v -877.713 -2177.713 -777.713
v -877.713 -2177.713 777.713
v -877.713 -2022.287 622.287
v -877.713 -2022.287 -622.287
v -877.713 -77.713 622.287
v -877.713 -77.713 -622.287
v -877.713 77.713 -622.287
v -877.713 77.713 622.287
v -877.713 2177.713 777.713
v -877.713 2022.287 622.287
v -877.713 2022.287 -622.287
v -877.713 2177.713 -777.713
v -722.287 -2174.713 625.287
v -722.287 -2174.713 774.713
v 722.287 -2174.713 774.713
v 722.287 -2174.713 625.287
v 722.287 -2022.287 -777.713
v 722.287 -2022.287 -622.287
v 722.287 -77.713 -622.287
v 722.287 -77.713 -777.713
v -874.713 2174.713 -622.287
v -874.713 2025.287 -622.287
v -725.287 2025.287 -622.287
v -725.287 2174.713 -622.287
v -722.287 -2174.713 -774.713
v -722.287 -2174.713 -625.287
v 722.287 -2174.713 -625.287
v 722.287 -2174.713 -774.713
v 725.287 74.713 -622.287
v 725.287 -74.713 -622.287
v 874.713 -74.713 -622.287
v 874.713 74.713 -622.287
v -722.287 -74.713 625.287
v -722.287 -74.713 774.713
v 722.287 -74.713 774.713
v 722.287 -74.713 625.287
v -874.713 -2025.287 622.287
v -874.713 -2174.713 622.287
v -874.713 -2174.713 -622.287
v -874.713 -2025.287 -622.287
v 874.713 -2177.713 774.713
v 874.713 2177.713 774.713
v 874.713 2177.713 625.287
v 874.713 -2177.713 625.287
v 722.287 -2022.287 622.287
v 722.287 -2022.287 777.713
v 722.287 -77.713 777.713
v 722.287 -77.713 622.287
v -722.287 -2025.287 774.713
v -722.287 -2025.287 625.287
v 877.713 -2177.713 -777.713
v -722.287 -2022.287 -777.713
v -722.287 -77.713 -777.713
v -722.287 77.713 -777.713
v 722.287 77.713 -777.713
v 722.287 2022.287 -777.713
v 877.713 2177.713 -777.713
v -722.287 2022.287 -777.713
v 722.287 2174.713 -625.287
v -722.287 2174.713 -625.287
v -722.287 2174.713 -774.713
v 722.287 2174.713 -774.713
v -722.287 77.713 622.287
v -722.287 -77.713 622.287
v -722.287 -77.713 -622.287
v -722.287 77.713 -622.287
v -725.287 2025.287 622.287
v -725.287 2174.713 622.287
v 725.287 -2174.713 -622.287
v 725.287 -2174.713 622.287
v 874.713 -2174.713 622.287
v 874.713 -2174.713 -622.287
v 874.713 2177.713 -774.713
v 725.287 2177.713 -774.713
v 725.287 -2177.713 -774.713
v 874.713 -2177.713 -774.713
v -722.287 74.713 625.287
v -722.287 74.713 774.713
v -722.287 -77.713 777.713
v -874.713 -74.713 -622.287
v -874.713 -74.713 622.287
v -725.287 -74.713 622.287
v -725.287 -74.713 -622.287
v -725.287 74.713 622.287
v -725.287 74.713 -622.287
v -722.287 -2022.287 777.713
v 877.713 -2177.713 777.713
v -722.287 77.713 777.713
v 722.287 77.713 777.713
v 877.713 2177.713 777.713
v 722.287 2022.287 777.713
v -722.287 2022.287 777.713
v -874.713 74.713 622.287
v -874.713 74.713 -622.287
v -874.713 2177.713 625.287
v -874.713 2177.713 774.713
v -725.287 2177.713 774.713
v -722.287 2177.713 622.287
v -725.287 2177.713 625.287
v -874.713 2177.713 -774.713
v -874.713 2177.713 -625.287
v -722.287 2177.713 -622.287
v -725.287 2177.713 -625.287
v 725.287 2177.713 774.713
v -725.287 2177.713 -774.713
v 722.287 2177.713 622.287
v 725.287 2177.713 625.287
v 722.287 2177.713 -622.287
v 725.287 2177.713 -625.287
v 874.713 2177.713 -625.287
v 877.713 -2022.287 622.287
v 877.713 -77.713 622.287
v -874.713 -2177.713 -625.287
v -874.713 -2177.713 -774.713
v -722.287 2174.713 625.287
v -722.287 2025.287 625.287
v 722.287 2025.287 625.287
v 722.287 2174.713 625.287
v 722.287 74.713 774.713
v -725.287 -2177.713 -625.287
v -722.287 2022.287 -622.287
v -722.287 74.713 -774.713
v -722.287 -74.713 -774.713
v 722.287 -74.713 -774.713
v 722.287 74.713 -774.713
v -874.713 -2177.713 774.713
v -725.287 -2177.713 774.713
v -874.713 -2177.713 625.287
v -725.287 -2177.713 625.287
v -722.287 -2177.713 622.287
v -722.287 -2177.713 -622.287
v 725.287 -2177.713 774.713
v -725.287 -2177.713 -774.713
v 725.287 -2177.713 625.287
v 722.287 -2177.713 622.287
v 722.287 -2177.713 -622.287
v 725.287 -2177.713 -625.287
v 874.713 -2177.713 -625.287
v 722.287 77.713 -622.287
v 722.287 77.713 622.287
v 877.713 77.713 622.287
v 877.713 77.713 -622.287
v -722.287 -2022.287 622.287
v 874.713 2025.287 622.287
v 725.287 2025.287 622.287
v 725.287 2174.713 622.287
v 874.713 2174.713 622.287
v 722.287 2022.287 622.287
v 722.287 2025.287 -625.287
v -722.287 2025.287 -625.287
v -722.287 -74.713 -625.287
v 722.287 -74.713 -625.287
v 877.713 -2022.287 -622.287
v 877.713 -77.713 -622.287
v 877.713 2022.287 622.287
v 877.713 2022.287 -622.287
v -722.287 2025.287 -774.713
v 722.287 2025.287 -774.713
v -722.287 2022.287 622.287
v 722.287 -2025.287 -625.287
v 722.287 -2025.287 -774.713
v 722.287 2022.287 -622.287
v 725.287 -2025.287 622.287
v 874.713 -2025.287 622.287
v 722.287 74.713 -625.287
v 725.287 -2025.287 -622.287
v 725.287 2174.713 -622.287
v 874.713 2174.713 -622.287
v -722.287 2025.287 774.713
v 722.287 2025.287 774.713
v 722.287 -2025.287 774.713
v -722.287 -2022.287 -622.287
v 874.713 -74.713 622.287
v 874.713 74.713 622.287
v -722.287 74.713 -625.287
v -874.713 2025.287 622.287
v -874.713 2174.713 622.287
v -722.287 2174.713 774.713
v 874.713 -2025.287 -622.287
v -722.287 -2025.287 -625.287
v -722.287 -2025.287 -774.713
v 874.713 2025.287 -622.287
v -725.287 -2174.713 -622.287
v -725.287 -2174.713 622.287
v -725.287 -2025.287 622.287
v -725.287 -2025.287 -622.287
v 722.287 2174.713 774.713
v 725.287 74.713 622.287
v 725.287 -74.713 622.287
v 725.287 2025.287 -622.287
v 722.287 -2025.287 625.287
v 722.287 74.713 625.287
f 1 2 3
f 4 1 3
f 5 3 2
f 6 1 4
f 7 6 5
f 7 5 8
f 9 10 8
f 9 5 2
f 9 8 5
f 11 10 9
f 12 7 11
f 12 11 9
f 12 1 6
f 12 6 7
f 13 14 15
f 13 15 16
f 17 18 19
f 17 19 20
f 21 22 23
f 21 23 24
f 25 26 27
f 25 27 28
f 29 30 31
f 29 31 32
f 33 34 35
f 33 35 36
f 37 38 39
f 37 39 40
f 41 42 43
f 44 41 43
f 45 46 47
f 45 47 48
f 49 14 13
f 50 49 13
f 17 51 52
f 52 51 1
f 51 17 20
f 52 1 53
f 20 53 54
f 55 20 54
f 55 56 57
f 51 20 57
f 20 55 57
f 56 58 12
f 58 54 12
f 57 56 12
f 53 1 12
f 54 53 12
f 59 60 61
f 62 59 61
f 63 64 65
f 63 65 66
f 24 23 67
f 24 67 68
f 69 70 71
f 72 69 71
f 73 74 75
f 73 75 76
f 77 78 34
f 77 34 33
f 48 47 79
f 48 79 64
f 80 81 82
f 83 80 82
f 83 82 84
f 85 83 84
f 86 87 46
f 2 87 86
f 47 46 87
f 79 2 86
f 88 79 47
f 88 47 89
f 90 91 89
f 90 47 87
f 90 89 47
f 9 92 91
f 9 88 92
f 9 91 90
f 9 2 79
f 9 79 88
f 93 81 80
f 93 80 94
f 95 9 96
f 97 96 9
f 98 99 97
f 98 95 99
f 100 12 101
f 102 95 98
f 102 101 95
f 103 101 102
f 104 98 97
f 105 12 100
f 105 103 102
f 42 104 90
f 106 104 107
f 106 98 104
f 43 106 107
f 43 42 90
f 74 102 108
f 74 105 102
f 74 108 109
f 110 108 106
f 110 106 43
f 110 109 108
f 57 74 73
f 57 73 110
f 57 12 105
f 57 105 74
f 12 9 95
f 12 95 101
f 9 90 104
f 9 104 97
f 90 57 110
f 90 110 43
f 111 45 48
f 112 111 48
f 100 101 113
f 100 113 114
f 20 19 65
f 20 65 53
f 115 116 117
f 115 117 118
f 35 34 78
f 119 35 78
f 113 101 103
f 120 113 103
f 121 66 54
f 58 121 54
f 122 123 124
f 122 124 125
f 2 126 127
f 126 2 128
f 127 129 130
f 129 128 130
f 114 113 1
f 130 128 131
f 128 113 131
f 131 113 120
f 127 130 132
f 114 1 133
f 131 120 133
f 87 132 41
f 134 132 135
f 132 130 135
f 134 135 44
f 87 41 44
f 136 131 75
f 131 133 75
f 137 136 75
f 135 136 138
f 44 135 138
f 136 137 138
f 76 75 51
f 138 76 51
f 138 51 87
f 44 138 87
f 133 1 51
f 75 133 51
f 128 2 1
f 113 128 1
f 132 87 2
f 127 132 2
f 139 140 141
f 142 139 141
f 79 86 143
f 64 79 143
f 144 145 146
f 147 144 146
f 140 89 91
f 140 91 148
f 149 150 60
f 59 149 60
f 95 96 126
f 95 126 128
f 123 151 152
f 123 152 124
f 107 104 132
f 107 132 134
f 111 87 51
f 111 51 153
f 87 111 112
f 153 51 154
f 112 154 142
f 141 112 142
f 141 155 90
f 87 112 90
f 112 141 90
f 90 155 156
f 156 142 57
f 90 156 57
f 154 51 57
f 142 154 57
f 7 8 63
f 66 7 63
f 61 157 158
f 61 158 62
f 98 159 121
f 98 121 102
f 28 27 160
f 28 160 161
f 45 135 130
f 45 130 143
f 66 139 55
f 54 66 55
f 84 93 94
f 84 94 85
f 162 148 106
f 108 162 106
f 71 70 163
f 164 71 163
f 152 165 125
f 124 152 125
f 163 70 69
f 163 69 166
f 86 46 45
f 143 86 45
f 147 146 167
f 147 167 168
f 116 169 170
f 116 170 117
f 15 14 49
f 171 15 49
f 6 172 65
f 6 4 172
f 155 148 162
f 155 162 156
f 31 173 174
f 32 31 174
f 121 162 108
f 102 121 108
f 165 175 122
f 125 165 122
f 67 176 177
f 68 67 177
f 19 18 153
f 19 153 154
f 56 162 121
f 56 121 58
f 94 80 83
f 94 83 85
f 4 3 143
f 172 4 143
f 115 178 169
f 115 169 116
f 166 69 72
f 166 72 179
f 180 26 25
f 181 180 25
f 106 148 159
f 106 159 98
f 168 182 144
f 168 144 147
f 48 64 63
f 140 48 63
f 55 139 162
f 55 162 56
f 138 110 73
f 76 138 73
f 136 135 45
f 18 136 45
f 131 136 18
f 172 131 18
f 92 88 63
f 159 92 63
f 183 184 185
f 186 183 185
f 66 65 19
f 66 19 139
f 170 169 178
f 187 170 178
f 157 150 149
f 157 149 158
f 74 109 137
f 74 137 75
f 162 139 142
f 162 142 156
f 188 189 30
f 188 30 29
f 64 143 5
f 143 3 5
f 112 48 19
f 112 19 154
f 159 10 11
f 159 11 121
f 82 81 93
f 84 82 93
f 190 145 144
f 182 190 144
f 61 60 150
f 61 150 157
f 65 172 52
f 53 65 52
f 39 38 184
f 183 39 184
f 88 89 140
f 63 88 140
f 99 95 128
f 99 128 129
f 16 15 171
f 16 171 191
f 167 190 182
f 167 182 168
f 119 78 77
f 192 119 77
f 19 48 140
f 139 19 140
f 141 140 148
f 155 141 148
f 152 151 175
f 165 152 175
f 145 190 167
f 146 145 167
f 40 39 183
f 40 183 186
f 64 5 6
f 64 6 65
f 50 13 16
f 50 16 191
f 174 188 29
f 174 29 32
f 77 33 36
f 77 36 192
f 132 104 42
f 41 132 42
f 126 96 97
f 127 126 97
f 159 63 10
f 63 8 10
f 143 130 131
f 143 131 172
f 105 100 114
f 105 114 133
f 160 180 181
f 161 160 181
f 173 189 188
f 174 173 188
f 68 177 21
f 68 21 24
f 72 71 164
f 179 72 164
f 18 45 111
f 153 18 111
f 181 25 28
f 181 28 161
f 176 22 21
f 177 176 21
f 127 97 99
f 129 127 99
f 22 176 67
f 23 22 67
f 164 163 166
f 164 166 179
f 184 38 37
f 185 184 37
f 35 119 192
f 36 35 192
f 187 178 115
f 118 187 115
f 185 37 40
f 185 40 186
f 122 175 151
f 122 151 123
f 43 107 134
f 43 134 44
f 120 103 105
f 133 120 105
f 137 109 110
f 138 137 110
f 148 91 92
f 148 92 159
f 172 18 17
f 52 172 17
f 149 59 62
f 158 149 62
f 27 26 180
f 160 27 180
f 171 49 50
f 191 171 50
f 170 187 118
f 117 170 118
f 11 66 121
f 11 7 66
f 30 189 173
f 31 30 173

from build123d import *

# Parameters (mm, degrees)
BOSS_EXTRUDE1_START  = -2177.712701274
SKETCH1_W            = 155.425402548
SKETCH1_H            = 155.425402548
SKETCH1_W_2          = 149.425402548
SKETCH1_H_2          = 149.425402548
BOSS_EXTRUDE1_DEPTH  = 4355.425402548
BOSS_EXTRUDE2_START  = -2177.712701274
SKETCH2_W            = 155.425402548
SKETCH2_H            = 155.425402548
SKETCH2_W_2          = 149.425402548
SKETCH2_H_2          = 149.425402548
BOSS_EXTRUDE2_DEPTH  = 4355.425402548
BOSS_EXTRUDE3_START  = -2177.712701274
SKETCH3_W            = 155.425402548
SKETCH3_H            = 155.425402548
SKETCH3_W_2          = 149.425402548
SKETCH3_H_2          = 149.425402548
BOSS_EXTRUDE3_DEPTH  = 4355.425402548
BOSS_EXTRUDE4_START  = -2177.712701274
SKETCH4_W            = 155.425402548
SKETCH4_H            = 155.425402548
SKETCH4_W_2          = 149.425402548
SKETCH4_H_2          = 149.425402548
BOSS_EXTRUDE4_DEPTH  = 4355.425402548
BOSS_EXTRUDE5_START  = -722.287298726
SKETCH5_W            = 155.425402548
SKETCH5_H            = 155.425402548
SKETCH5_W_2          = 149.425402548
SKETCH5_H_2          = 149.425402548
BOSS_EXTRUDE5_DEPTH  = 1444.574597452
BOSS_EXTRUDE6_START  = -722.287298726
SKETCH6_W            = 155.425402548
SKETCH6_H            = 155.425402548
SKETCH6_W_2          = 149.425402548
SKETCH6_H_2          = 149.425402548
BOSS_EXTRUDE6_DEPTH  = 1444.574597452
BOSS_EXTRUDE7_START  = -622.287298726
SKETCH7_W            = 155.425402548
SKETCH7_H            = 155.425402548
SKETCH7_W_2          = 149.425402548
SKETCH7_H_2          = 149.425402548
BOSS_EXTRUDE7_DEPTH  = 1244.574597452
BOSS_EXTRUDE8_START  = -622.287298726
SKETCH8_W            = 155.425402548
SKETCH8_H            = 155.425402548
SKETCH8_W_2          = 149.425402548
SKETCH8_H_2          = 149.425402548
BOSS_EXTRUDE8_DEPTH  = 1244.574597452
BOSS_EXTRUDE9_START  = -722.287298726
SKETCH9_W            = 155.425402548
SKETCH9_H            = 155.425402548
SKETCH9_W_2          = 149.425402548
SKETCH9_H_2          = 149.425402548
BOSS_EXTRUDE9_DEPTH  = 1444.574597452
BOSS_EXTRUDE10_START = -722.287298726
SKETCH10_W           = 155.425402548
SKETCH10_H           = 155.425402548
SKETCH10_W_2         = 149.425402548
SKETCH10_H_2         = 149.425402548
BOSS_EXTRUDE10_DEPTH = 1444.574597452
BOSS_EXTRUDE11_START = -622.287298726
SKETCH11_W           = 155.425402548
SKETCH11_H           = 155.425402548
SKETCH11_W_2         = 149.425402548
SKETCH11_H_2         = 149.425402548
BOSS_EXTRUDE11_DEPTH = 1244.574597452
BOSS_EXTRUDE12_START = -622.287298726
SKETCH12_W           = 155.425402548
SKETCH12_H           = 155.425402548
SKETCH12_W_2         = 149.425402548
SKETCH12_H_2         = 149.425402548
BOSS_EXTRUDE12_DEPTH = 1244.574597452
BOSS_EXTRUDE13_START = -722.287298726
SKETCH13_W           = 155.425402548
SKETCH13_H           = 155.425402548
SKETCH13_W_2         = 149.425402548
SKETCH13_H_2         = 149.425402548
BOSS_EXTRUDE13_DEPTH = 1444.574597452
BOSS_EXTRUDE14_START = -722.287298726
SKETCH14_W           = 155.425402548
SKETCH14_H           = 155.425402548
SKETCH14_W_2         = 149.425402548
SKETCH14_H_2         = 149.425402548
BOSS_EXTRUDE14_DEPTH = 1444.574597452
BOSS_EXTRUDE15_START = -622.287298726
SKETCH15_W           = 155.425402548
SKETCH15_H           = 155.425402548
SKETCH15_W_2         = 149.425402548
SKETCH15_H_2         = 149.425402548
BOSS_EXTRUDE15_DEPTH = 1244.574597452
BOSS_EXTRUDE16_START = -622.287298726
SKETCH16_W           = 155.425402548
SKETCH16_H           = 155.425402548
SKETCH16_W_2         = 149.425402548
SKETCH16_H_2         = 149.425402548
BOSS_EXTRUDE16_DEPTH = 1244.574597452


with BuildPart() as part:
    # Sketch1 → Boss-Extrude1 (new body)
    with BuildSketch(Plane(origin=(0, 0, 0), x_dir=(1, 0, 0), z_dir=(0, 1, 0)).offset(BOSS_EXTRUDE1_START)):
        with Locations((-800, 700)):
            Rectangle(SKETCH1_W, SKETCH1_H)
        with Locations((-800, 700)):
            Rectangle(SKETCH1_W_2, SKETCH1_H_2, mode=Mode.SUBTRACT)
    extrude(amount=BOSS_EXTRUDE1_DEPTH)



with BuildPart() as body_2:
    # Sketch2 → Boss-Extrude2 (new body)
    with BuildSketch(Plane(origin=(0, 0, 0), x_dir=(1, 0, 0), z_dir=(0, 1, 0)).offset(BOSS_EXTRUDE2_START)):
        with Locations((-800, -700)):
            Rectangle(SKETCH2_W, SKETCH2_H)
        with Locations((-800, -700)):
            Rectangle(SKETCH2_W_2, SKETCH2_H_2, mode=Mode.SUBTRACT)
    extrude(amount=BOSS_EXTRUDE2_DEPTH)



with BuildPart() as body_3:
    # Sketch3 → Boss-Extrude3 (new body)
    with BuildSketch(Plane(origin=(0, 0, 0), x_dir=(1, 0, 0), z_dir=(0, 1, 0)).offset(BOSS_EXTRUDE3_START)):
        with Locations((800, 700)):
            Rectangle(SKETCH3_W, SKETCH3_H)
        with Locations((800, 700)):
            Rectangle(SKETCH3_W_2, SKETCH3_H_2, mode=Mode.SUBTRACT)
    extrude(amount=BOSS_EXTRUDE3_DEPTH)


with BuildPart() as body_4:
    # Sketch4 → Boss-Extrude4 (new body)
    with BuildSketch(Plane(origin=(0, 0, 0), x_dir=(1, 0, 0), z_dir=(0, 1, 0)).offset(BOSS_EXTRUDE4_START)):
        with Locations((800, -700)):
            Rectangle(SKETCH4_W, SKETCH4_H)
        with Locations((800, -700)):
            Rectangle(SKETCH4_W_2, SKETCH4_H_2, mode=Mode.SUBTRACT)
    extrude(amount=BOSS_EXTRUDE4_DEPTH)


with BuildPart() as part_1:
    add(part.part)

    add(body_3.part)  # Boss-Extrude5 merges body 3
    # Sketch5 → Boss-Extrude5 (add)
    with BuildSketch(Plane(origin=(0, 0, 0), x_dir=(0, 0, -1), z_dir=(1, 0, 0)).offset(BOSS_EXTRUDE5_START)):
        with Locations((700, -2100)):
            Rectangle(SKETCH5_W, SKETCH5_H)
        with Locations((700, -2100)):
            Rectangle(SKETCH5_W_2, SKETCH5_H_2, mode=Mode.SUBTRACT)
    extrude(amount=BOSS_EXTRUDE5_DEPTH)



with BuildPart() as body_2_1:
    add(body_2.part)

    add(body_4.part)  # Boss-Extrude6 merges body 4
    # Sketch6 → Boss-Extrude6 (add)
    with BuildSketch(Plane(origin=(0, 0, 0), x_dir=(0, 0, -1), z_dir=(1, 0, 0)).offset(BOSS_EXTRUDE6_START)):
        with Locations((-700, -2100)):
            Rectangle(SKETCH6_W, SKETCH6_H)
        with Locations((-700, -2100)):
            Rectangle(SKETCH6_W_2, SKETCH6_H_2, mode=Mode.SUBTRACT)
    extrude(amount=BOSS_EXTRUDE6_DEPTH)


with BuildPart() as part_2:
    add(part_1.part)

    add(body_2_1.part)  # Boss-Extrude7 merges body 2
    # Sketch7 → Boss-Extrude7 (add)
    with BuildSketch(Plane.XY.offset(BOSS_EXTRUDE7_START)):
        with Locations((-800, -2100)):
            Rectangle(SKETCH7_W, SKETCH7_H)
        with Locations((-800, -2100)):
            Rectangle(SKETCH7_W_2, SKETCH7_H_2, mode=Mode.SUBTRACT)
    extrude(amount=BOSS_EXTRUDE7_DEPTH)

    # Sketch8 → Boss-Extrude8 (add)
    with BuildSketch(Plane.XY.offset(BOSS_EXTRUDE8_START)):
        with Locations((800, -2100)):
            Rectangle(SKETCH8_W, SKETCH8_H)
        with Locations((800, -2100)):
            Rectangle(SKETCH8_W_2, SKETCH8_H_2, mode=Mode.SUBTRACT)
    extrude(amount=BOSS_EXTRUDE8_DEPTH)

    # Sketch9 → Boss-Extrude9 (add)
    with BuildSketch(Plane(origin=(0, 0, 0), x_dir=(0, 0, -1), z_dir=(1, 0, 0)).offset(BOSS_EXTRUDE9_START)):
        with Locations((700, 0)):
            Rectangle(SKETCH9_W, SKETCH9_H)
        with Locations((700, 0)):
            Rectangle(SKETCH9_W_2, SKETCH9_H_2, mode=Mode.SUBTRACT)
    extrude(amount=BOSS_EXTRUDE9_DEPTH)

    # Sketch10 → Boss-Extrude10 (add)
    with BuildSketch(Plane(origin=(0, 0, 0), x_dir=(0, 0, -1), z_dir=(1, 0, 0)).offset(BOSS_EXTRUDE10_START)):
        with Locations((-700, 0)):
            Rectangle(SKETCH10_W, SKETCH10_H)
        with Locations((-700, 0)):
            Rectangle(SKETCH10_W_2, SKETCH10_H_2, mode=Mode.SUBTRACT)
    extrude(amount=BOSS_EXTRUDE10_DEPTH)

    # Sketch11 → Boss-Extrude11 (add)
    with BuildSketch(Plane.XY.offset(BOSS_EXTRUDE11_START)):
        with Locations((-800, 0)):
            Rectangle(SKETCH11_W, SKETCH11_H)
        with Locations((-800, 0)):
            Rectangle(SKETCH11_W_2, SKETCH11_H_2, mode=Mode.SUBTRACT)
    extrude(amount=BOSS_EXTRUDE11_DEPTH)

    # Sketch12 → Boss-Extrude12 (add)
    with BuildSketch(Plane.XY.offset(BOSS_EXTRUDE12_START)):
        with Locations((800, 0)):
            Rectangle(SKETCH12_W, SKETCH12_H)
        with Locations((800, 0)):
            Rectangle(SKETCH12_W_2, SKETCH12_H_2, mode=Mode.SUBTRACT)
    extrude(amount=BOSS_EXTRUDE12_DEPTH)

    # Sketch13 → Boss-Extrude13 (add)
    with BuildSketch(Plane(origin=(0, 0, 0), x_dir=(0, 0, -1), z_dir=(1, 0, 0)).offset(BOSS_EXTRUDE13_START)):
        with Locations((700, 2100)):
            Rectangle(SKETCH13_W, SKETCH13_H)
        with Locations((700, 2100)):
            Rectangle(SKETCH13_W_2, SKETCH13_H_2, mode=Mode.SUBTRACT)
    extrude(amount=BOSS_EXTRUDE13_DEPTH)

    # Sketch14 → Boss-Extrude14 (add)
    with BuildSketch(Plane(origin=(0, 0, 0), x_dir=(0, 0, -1), z_dir=(1, 0, 0)).offset(BOSS_EXTRUDE14_START)):
        with Locations((-700, 2100)):
            Rectangle(SKETCH14_W, SKETCH14_H)
        with Locations((-700, 2100)):
            Rectangle(SKETCH14_W_2, SKETCH14_H_2, mode=Mode.SUBTRACT)
    extrude(amount=BOSS_EXTRUDE14_DEPTH)

    # Sketch15 → Boss-Extrude15 (add)
    with BuildSketch(Plane.XY.offset(BOSS_EXTRUDE15_START)):
        with Locations((-800, 2100)):
            Rectangle(SKETCH15_W, SKETCH15_H)
        with Locations((-800, 2100)):
            Rectangle(SKETCH15_W_2, SKETCH15_H_2, mode=Mode.SUBTRACT)
    extrude(amount=BOSS_EXTRUDE15_DEPTH)

    # Sketch16 → Boss-Extrude16 (add)
    with BuildSketch(Plane.XY.offset(BOSS_EXTRUDE16_START)):
        with Locations((800, 2100)):
            Rectangle(SKETCH16_W, SKETCH16_H)
        with Locations((800, 2100)):
            Rectangle(SKETCH16_W_2, SKETCH16_H_2, mode=Mode.SUBTRACT)
    extrude(amount=BOSS_EXTRUDE16_DEPTH)


solid = part_2.part
